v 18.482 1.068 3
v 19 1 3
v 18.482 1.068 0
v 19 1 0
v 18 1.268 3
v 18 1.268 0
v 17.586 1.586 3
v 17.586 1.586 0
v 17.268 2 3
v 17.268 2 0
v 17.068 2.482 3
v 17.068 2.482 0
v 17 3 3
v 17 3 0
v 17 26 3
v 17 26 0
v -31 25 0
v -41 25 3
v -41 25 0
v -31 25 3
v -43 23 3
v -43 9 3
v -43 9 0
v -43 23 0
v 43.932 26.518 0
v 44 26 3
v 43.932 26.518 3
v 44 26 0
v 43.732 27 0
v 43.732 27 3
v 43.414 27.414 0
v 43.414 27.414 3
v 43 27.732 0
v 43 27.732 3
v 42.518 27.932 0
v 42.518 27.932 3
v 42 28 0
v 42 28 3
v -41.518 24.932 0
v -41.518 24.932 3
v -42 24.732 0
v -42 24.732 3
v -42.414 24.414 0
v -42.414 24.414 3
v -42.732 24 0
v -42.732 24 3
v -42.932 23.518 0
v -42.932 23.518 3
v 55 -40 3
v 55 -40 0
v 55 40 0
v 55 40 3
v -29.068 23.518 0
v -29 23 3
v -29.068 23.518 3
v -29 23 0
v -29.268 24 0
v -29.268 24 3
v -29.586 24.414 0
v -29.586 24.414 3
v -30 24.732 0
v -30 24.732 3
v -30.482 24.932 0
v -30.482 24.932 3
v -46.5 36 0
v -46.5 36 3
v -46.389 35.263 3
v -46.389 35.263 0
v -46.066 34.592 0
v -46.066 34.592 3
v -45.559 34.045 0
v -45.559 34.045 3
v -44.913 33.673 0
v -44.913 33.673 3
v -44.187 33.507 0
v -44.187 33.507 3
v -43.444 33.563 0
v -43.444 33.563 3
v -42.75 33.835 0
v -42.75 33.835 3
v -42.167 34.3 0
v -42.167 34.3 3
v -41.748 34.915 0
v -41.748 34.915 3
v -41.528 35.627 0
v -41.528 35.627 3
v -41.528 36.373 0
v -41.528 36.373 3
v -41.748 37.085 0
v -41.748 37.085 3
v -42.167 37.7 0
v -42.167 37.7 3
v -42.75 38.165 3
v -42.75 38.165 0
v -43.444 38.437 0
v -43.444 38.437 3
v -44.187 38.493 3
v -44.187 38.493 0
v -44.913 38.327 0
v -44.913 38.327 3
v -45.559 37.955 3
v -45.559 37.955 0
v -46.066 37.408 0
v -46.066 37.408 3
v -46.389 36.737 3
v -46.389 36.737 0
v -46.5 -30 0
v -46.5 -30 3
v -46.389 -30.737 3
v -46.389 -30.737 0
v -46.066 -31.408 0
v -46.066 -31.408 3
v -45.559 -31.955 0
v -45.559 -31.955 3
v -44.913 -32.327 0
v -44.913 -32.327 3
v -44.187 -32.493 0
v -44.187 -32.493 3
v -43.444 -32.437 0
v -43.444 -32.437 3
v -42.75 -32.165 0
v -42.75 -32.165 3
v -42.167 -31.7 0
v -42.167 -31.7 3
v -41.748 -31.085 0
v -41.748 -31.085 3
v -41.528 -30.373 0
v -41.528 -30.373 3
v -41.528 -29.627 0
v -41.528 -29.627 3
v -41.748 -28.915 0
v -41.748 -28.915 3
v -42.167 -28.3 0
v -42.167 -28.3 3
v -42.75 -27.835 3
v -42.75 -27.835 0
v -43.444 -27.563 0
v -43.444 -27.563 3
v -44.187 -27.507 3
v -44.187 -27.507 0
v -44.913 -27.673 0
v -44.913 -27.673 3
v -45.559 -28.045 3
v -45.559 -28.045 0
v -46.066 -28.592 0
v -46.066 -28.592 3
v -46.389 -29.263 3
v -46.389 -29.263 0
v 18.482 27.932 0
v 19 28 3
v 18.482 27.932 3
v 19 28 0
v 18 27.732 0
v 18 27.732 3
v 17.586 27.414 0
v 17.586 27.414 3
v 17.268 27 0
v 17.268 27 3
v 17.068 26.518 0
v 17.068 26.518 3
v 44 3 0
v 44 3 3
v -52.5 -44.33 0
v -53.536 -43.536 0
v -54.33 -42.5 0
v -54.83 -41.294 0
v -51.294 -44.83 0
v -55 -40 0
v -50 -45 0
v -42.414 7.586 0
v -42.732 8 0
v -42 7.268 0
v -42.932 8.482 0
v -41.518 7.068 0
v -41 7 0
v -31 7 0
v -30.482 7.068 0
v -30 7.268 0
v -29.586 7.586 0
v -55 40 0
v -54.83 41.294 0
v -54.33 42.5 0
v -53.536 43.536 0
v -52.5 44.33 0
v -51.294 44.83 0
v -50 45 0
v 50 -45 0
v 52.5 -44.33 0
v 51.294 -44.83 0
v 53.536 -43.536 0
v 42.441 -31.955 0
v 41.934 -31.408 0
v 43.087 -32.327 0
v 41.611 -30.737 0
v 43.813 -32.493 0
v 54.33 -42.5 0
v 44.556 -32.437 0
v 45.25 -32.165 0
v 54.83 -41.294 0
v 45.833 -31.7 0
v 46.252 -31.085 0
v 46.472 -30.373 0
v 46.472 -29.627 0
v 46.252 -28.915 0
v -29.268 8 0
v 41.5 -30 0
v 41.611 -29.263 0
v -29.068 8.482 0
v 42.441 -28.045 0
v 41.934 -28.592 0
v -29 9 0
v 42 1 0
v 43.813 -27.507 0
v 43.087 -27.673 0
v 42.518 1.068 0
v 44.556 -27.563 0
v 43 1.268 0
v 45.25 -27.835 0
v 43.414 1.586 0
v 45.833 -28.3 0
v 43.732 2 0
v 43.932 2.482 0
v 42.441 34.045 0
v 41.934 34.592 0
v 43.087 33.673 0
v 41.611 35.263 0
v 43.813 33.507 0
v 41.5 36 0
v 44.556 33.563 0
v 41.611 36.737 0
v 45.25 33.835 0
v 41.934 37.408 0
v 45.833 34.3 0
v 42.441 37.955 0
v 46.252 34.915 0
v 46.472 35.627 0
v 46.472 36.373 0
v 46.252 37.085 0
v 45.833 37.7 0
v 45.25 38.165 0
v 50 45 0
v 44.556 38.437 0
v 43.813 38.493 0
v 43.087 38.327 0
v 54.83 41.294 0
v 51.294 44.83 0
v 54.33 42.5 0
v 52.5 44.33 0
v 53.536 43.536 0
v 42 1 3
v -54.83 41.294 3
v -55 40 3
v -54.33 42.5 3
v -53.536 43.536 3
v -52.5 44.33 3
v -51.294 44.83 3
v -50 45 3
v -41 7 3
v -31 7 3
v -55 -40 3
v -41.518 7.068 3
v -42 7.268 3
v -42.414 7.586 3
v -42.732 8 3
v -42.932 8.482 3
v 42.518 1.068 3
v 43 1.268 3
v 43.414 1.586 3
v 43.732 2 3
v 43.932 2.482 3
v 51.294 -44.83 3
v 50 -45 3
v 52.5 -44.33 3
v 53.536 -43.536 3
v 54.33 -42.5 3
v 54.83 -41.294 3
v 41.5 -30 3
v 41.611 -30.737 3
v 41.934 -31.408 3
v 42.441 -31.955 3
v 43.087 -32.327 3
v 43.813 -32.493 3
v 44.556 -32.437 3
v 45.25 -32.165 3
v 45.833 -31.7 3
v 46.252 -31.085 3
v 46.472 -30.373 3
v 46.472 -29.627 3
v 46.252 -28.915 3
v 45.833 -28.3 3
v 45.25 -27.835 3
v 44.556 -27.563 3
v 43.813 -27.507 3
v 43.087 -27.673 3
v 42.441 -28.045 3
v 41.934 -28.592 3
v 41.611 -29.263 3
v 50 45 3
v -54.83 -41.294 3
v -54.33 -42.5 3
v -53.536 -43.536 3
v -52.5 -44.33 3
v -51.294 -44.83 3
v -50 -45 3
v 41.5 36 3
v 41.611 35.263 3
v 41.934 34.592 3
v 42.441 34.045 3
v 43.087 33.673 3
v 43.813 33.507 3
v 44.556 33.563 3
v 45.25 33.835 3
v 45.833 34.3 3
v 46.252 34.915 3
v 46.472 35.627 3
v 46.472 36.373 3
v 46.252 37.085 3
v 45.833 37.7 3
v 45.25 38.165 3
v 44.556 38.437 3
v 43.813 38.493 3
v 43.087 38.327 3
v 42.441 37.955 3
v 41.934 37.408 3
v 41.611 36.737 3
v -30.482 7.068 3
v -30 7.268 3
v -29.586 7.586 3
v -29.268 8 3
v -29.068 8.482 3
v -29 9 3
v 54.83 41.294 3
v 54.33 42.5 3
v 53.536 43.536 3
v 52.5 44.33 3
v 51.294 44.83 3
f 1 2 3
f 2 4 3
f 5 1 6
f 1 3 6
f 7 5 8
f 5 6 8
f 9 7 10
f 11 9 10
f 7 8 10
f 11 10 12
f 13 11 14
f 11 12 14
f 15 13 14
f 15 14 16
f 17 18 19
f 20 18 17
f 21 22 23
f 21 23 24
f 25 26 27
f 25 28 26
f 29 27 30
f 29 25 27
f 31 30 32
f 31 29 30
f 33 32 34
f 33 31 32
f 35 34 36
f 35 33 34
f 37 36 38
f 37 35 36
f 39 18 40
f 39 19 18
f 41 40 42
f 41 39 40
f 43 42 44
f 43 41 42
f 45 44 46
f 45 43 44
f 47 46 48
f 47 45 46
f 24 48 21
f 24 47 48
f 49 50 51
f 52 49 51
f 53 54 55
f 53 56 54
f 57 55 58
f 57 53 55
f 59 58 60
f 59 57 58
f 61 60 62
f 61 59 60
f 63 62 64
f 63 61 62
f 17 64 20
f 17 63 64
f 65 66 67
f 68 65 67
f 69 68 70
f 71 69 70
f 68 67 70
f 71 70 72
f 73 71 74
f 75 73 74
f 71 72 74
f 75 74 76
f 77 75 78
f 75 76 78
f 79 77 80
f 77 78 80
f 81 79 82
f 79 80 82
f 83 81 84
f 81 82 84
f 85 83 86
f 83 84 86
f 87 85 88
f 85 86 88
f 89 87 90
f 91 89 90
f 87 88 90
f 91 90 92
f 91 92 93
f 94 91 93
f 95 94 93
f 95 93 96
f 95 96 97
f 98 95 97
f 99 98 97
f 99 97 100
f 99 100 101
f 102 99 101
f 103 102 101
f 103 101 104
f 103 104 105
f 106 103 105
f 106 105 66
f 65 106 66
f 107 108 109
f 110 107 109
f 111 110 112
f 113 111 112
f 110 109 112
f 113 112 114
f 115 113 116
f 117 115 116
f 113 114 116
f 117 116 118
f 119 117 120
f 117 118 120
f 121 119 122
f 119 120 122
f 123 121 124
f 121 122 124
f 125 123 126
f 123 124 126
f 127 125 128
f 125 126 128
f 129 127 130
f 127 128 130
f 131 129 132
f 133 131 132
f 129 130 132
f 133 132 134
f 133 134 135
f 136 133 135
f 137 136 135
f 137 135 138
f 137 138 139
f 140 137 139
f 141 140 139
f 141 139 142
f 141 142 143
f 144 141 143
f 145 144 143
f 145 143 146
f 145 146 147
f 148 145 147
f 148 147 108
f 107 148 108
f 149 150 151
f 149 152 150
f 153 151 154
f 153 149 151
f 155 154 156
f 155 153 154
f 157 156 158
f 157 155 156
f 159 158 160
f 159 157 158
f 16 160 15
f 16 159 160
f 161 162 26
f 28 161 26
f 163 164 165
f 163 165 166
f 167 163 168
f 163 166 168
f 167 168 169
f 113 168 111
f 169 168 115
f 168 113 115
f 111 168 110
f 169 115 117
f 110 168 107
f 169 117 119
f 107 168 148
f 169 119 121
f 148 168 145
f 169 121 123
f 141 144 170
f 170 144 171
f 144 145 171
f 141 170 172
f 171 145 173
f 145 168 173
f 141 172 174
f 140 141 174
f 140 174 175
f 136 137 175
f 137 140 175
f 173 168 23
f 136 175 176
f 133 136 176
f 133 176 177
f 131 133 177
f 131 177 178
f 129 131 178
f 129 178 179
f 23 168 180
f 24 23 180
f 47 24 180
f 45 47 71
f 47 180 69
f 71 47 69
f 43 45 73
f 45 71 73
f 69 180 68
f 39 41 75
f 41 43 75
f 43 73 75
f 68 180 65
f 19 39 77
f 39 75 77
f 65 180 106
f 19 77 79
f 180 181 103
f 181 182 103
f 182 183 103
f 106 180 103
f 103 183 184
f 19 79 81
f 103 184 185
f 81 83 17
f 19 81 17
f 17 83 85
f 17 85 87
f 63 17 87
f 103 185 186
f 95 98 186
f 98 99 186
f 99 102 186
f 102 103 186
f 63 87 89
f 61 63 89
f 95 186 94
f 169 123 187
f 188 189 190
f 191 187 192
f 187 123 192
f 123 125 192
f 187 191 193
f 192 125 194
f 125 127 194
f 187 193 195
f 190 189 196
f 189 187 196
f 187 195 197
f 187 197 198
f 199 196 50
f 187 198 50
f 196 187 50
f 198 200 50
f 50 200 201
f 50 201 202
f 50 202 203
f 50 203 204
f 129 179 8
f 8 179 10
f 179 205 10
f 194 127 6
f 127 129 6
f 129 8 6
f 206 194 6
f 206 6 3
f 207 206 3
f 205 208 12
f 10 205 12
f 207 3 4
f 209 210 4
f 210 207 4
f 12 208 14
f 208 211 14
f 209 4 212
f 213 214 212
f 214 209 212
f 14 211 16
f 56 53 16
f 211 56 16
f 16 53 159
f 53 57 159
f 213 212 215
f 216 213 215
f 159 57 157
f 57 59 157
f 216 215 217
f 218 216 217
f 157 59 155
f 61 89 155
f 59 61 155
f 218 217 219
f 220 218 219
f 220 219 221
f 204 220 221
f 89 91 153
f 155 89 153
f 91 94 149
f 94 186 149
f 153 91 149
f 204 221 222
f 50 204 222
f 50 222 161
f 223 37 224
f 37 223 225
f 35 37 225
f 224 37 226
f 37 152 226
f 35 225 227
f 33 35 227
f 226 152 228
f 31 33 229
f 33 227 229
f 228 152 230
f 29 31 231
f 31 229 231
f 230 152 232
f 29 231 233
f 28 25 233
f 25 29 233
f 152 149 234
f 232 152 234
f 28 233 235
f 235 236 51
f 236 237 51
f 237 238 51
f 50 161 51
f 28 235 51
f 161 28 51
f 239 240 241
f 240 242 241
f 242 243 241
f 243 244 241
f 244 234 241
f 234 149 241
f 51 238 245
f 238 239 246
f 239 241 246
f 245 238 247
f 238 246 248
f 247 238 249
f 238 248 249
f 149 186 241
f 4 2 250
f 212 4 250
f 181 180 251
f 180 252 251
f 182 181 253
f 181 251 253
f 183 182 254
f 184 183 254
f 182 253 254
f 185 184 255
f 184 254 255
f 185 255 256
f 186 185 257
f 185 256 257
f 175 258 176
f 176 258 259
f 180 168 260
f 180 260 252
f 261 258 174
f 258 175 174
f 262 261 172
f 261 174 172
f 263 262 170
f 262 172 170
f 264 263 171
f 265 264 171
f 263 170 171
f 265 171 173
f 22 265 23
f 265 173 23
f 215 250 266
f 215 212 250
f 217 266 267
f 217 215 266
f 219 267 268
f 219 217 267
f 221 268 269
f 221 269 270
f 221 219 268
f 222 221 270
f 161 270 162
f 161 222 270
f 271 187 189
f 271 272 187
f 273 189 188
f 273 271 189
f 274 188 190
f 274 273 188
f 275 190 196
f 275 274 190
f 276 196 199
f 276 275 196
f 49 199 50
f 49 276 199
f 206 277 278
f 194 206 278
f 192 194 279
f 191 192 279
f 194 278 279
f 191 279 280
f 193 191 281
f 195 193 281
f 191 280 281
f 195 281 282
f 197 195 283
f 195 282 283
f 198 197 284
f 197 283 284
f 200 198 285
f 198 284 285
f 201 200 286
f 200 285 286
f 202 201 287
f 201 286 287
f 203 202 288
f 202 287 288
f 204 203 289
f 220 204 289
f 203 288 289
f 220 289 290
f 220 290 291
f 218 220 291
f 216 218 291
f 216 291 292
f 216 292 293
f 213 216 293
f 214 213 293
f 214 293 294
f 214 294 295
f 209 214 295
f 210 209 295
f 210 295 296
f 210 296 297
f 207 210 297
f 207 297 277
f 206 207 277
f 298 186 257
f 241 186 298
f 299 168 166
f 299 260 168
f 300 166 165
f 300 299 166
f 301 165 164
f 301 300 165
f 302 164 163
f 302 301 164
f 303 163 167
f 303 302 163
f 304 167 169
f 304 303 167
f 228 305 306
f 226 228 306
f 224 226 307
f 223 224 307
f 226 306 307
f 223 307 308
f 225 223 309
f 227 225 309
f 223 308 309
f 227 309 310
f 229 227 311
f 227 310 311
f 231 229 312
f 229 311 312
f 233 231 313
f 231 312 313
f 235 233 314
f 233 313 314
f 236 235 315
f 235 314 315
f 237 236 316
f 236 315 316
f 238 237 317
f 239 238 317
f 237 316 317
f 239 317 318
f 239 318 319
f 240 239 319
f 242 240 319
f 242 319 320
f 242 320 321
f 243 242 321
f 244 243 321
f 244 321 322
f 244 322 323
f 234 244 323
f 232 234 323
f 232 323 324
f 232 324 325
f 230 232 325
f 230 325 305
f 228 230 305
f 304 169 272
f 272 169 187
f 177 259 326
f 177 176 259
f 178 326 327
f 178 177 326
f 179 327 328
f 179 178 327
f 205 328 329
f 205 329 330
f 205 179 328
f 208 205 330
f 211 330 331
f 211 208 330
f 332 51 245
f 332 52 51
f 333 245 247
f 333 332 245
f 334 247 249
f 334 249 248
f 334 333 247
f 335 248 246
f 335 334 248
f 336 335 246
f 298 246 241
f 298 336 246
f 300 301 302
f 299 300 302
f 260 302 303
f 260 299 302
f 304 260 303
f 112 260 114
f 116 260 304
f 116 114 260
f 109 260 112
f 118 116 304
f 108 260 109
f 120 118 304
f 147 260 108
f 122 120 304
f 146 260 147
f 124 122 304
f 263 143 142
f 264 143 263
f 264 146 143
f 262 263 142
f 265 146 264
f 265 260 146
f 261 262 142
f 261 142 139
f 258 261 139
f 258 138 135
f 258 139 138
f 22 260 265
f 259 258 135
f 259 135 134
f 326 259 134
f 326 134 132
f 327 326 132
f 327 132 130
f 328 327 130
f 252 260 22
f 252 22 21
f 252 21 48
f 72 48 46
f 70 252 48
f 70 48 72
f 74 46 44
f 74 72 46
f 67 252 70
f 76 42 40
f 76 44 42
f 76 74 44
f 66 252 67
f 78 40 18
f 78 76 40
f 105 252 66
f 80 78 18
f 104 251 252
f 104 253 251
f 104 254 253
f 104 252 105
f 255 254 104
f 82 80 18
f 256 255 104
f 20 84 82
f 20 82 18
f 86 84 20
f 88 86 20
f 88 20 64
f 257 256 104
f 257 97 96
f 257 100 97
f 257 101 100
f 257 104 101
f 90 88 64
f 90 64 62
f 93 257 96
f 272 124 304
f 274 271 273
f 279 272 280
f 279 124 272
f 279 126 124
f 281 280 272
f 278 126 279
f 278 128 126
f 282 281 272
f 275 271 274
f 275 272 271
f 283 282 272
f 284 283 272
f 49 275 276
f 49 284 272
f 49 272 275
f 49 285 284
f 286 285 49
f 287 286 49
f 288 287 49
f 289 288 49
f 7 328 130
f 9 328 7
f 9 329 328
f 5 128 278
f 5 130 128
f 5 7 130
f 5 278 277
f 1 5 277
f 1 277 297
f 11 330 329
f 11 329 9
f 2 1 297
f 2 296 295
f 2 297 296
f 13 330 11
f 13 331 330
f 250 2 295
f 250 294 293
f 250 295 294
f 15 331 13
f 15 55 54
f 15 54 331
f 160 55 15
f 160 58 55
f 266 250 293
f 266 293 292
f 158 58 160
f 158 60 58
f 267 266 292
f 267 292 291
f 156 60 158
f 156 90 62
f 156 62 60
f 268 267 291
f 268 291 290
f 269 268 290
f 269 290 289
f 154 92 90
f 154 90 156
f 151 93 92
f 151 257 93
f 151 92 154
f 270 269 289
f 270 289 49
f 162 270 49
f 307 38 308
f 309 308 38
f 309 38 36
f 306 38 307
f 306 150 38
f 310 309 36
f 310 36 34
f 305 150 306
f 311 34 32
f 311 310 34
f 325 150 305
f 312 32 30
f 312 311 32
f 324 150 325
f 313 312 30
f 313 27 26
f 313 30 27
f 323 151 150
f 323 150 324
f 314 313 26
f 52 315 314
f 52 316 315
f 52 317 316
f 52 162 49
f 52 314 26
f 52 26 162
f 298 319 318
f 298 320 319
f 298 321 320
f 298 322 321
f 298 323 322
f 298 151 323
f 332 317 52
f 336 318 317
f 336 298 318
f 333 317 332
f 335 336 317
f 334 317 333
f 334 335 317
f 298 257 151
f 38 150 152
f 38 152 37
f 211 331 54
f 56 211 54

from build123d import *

# Parameters (mm, degrees)
F0_W     = 110
F0_H     = 90
F1_DEPTH = 3
F2_R     = 5
F4_D     = 5
F5_D     = 5
F6_W     = 14
F6_H     = 18
F6_W_2   = 27
F6_H_2   = 27
F7_DEPTH = 3.001
F8_R     = 2


with BuildPart() as f1:
    # F0 (on Top) → F1 (new body)
    with BuildSketch(Plane.XY):
        Rectangle(F0_W, F0_H)
    extrude(amount=F1_DEPTH)

    # F2
    f2_edges = [f1.edges().sort_by_distance(p)[0] for p in [
        (55, 45, 1.5),
        (55, -45, 1.5),
        (-55, 45, 1.5),
        (-55, -45, 1.5),
    ]]
    fillet(f2_edges, radius=F2_R)

    # F4 (through all)
    with Locations(Plane(origin=(0, 0, 0), x_dir=(1, 0, 0), z_dir=(0, 0, -1))):
        with Locations((-44, -36), (44, -36)):
            Hole(F4_D / 2)

    # F5 (through all)
    with Locations(Plane(origin=(0, 0, 0), x_dir=(1, 0, 0), z_dir=(0, 0, -1))):
        with Locations((-44, 30), (44, 30)):
            Hole(F5_D / 2)

    # F6 (on face) → F7 (cut, through all)
    with BuildSketch(Plane.XY.offset(3)):
        with Locations((-36, 16)):
            Rectangle(F6_W, F6_H)
        with Locations((30.5, 14.5)):
            Rectangle(F6_W_2, F6_H_2)
    extrude(amount=-F7_DEPTH, mode=Mode.SUBTRACT)

    # F8
    f8_edges = [f1.edges().sort_by_distance(p)[0] for p in [
        (-43, 7, 1.5),
        (17, 1, 1.5),
        (-29, 7, 1.5),
        (-43, 25, 1.5),
        (17, 28, 1.5),
        (44, 28, 1.5),
        (44, 1, 1.5),
        (-29, 25, 1.5),
    ]]
    fillet(f8_edges, radius=F8_R)


solid = f1.part
